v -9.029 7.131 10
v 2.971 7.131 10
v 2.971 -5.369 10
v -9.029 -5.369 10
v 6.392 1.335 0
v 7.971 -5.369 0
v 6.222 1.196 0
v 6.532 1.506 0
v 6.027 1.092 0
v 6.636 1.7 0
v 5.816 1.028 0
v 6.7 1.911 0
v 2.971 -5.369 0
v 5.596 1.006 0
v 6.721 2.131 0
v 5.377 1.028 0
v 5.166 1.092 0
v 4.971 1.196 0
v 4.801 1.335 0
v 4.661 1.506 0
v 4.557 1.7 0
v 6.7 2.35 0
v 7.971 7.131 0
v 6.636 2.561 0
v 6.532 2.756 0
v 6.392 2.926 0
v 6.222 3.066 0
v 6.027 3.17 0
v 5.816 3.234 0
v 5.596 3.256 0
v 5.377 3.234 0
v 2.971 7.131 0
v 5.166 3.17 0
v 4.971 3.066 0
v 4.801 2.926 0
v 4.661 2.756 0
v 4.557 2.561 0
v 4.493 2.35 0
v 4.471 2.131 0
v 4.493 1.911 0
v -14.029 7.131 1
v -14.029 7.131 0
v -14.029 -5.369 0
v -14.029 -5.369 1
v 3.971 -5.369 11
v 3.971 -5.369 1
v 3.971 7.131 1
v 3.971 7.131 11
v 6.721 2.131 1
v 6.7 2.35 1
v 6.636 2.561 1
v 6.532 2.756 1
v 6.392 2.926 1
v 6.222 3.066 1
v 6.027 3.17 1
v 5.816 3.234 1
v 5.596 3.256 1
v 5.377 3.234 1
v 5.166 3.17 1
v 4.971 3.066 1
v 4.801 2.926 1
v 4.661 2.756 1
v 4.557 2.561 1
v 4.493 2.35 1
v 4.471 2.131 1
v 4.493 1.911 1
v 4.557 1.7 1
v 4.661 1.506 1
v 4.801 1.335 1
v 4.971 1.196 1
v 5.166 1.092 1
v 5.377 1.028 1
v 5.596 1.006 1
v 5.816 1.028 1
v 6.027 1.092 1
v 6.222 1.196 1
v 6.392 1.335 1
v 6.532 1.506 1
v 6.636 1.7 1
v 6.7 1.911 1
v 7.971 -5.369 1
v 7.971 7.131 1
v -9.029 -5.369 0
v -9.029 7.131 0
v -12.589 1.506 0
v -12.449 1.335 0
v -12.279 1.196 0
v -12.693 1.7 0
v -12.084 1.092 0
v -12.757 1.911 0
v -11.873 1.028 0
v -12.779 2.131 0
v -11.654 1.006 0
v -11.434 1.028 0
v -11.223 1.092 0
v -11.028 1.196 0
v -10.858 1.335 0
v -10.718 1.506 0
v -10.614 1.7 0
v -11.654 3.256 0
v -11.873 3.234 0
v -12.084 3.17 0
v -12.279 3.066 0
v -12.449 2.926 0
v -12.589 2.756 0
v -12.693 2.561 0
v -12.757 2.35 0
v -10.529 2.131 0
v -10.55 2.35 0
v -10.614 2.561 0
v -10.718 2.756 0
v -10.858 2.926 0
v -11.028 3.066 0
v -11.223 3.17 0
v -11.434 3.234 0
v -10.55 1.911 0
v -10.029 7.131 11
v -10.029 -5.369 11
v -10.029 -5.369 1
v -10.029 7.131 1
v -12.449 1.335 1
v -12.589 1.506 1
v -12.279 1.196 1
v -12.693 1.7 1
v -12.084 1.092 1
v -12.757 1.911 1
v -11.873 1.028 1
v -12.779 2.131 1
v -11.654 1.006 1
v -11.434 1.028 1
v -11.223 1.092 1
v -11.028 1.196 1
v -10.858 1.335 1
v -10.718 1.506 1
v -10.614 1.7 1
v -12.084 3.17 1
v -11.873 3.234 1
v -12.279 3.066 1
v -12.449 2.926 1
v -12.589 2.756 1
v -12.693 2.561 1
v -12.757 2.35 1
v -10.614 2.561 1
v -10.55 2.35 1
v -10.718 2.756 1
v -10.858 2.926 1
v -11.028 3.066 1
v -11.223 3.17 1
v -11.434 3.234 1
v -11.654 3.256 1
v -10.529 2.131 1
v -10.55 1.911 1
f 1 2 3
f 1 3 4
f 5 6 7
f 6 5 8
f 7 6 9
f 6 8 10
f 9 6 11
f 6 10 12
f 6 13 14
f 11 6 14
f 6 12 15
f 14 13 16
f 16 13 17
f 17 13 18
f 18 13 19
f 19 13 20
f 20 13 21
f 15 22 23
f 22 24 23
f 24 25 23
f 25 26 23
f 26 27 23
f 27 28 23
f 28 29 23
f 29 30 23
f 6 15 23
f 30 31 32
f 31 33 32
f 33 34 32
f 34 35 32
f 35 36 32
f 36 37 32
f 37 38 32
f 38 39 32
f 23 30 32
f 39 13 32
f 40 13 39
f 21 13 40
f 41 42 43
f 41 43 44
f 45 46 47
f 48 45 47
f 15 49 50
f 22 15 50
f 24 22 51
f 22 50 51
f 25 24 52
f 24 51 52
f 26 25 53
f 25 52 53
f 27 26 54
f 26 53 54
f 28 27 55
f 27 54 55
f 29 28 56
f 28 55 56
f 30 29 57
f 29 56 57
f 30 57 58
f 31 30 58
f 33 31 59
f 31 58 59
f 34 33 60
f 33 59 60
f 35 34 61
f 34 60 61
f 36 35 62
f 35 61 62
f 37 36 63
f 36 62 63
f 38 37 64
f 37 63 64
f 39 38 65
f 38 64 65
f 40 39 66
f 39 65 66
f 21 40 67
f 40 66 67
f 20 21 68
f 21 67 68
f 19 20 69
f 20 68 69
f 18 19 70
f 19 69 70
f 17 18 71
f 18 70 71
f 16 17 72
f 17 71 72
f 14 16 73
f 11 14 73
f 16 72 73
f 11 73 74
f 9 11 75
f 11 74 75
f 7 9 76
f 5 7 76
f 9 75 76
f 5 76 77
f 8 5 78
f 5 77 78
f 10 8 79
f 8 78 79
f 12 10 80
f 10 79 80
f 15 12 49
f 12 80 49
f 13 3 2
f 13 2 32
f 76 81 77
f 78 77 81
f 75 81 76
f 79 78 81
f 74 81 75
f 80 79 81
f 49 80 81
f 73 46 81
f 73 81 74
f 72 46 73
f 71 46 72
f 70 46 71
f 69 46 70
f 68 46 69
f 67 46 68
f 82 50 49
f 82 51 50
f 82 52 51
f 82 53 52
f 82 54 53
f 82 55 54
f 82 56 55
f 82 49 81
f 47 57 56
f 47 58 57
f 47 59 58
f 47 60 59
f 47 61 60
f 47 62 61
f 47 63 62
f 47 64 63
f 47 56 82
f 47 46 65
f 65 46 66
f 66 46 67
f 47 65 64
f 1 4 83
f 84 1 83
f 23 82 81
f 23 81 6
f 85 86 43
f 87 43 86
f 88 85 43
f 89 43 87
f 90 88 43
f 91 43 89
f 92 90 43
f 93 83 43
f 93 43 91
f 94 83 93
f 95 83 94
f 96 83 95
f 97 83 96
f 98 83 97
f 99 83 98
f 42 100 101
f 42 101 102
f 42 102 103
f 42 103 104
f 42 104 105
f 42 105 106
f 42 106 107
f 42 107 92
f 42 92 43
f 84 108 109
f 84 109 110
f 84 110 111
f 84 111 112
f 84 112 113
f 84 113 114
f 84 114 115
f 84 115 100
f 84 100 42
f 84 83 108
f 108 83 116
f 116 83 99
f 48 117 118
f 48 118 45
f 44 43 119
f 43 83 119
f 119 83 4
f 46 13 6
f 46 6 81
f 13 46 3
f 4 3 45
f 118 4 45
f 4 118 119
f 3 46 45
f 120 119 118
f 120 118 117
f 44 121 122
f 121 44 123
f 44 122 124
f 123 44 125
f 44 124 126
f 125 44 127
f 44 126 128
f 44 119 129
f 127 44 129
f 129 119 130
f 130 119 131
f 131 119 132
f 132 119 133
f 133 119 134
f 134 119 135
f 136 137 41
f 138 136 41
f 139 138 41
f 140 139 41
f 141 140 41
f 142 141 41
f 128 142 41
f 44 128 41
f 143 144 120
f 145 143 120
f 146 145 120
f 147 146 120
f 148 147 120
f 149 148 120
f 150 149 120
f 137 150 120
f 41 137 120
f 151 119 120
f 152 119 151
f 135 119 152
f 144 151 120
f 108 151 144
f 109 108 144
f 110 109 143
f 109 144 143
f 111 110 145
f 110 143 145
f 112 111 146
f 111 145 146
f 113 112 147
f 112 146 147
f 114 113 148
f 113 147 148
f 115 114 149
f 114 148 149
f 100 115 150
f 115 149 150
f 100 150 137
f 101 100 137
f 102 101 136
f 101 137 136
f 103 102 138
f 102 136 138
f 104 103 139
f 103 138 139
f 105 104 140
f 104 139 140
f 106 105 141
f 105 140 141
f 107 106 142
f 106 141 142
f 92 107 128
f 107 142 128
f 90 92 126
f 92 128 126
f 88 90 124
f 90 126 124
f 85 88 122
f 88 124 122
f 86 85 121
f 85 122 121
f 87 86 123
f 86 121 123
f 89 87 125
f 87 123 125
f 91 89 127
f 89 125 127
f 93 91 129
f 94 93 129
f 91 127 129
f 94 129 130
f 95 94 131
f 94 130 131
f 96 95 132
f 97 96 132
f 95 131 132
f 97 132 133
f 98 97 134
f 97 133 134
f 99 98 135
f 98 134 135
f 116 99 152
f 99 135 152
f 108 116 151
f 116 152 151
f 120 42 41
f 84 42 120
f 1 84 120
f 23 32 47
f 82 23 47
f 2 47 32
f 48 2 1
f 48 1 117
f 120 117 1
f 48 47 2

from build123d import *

# Parameters (mm, degrees)
SKETCH2_W           = 14
SKETCH2_H           = 12.5
BOSS_EXTRUDE1_DEPTH = 11
SKETCH3_W           = 12
SKETCH3_H           = 10
CUT_EXTRUDE1_DEPTH  = 12.5
SKETCH4_W           = 1
SKETCH4_H           = 12.5
BOSS_EXTRUDE2_DEPTH = 4
SKETCH5_W           = 1
SKETCH5_H           = 12.5
BOSS_EXTRUDE3_DEPTH = 4
SKETCH6_R           = 1.125
CUT_EXTRUDE2_DEPTH  = 1


with BuildPart() as part:
    # Sketch2 → Boss-Extrude1 (new body)
    with BuildSketch(Plane.XY):
        with Locations((-3.028513908, 0.880933534)):
            Rectangle(SKETCH2_W, SKETCH2_H)
    extrude(amount=BOSS_EXTRUDE1_DEPTH)

    # Sketch3 → Cut-Extrude1 (cut)
    with BuildSketch(Plane(origin=(0, -5.369066466, 0), x_dir=(-1, 0, 0), z_dir=(0, -1, 0))):
        with Locations((3.028513908, -5)):
            Rectangle(SKETCH3_W, SKETCH3_H)
    extrude(amount=-CUT_EXTRUDE1_DEPTH, mode=Mode.SUBTRACT)

    # Sketch4 → Boss-Extrude2 (add)
    with BuildSketch(Plane(origin=(3.971486092, 0, 0), x_dir=(0, 0, -1), z_dir=(1, 0, 0))):
        with Locations((-0.5, 0.880933534)):
            Rectangle(SKETCH4_W, SKETCH4_H)
    extrude(amount=BOSS_EXTRUDE2_DEPTH)

    # Sketch5 → Boss-Extrude3 (add)
    with BuildSketch(Plane.ZY.offset(10.028513908)):
        with Locations((0.5, 0.880933534)):
            Rectangle(SKETCH5_W, SKETCH5_H)
    extrude(amount=BOSS_EXTRUDE3_DEPTH)

    # Sketch6 → Cut-Extrude2 (cut)
    with BuildSketch(Plane.XY.offset(1)):
        with Locations((-11.653513908, 2.130933534)):
            Circle(SKETCH6_R)
        with Locations((5.596486092, 2.130933534)):
            Circle(SKETCH6_R)
    extrude(amount=-CUT_EXTRUDE2_DEPTH, mode=Mode.SUBTRACT)


solid = part.part
